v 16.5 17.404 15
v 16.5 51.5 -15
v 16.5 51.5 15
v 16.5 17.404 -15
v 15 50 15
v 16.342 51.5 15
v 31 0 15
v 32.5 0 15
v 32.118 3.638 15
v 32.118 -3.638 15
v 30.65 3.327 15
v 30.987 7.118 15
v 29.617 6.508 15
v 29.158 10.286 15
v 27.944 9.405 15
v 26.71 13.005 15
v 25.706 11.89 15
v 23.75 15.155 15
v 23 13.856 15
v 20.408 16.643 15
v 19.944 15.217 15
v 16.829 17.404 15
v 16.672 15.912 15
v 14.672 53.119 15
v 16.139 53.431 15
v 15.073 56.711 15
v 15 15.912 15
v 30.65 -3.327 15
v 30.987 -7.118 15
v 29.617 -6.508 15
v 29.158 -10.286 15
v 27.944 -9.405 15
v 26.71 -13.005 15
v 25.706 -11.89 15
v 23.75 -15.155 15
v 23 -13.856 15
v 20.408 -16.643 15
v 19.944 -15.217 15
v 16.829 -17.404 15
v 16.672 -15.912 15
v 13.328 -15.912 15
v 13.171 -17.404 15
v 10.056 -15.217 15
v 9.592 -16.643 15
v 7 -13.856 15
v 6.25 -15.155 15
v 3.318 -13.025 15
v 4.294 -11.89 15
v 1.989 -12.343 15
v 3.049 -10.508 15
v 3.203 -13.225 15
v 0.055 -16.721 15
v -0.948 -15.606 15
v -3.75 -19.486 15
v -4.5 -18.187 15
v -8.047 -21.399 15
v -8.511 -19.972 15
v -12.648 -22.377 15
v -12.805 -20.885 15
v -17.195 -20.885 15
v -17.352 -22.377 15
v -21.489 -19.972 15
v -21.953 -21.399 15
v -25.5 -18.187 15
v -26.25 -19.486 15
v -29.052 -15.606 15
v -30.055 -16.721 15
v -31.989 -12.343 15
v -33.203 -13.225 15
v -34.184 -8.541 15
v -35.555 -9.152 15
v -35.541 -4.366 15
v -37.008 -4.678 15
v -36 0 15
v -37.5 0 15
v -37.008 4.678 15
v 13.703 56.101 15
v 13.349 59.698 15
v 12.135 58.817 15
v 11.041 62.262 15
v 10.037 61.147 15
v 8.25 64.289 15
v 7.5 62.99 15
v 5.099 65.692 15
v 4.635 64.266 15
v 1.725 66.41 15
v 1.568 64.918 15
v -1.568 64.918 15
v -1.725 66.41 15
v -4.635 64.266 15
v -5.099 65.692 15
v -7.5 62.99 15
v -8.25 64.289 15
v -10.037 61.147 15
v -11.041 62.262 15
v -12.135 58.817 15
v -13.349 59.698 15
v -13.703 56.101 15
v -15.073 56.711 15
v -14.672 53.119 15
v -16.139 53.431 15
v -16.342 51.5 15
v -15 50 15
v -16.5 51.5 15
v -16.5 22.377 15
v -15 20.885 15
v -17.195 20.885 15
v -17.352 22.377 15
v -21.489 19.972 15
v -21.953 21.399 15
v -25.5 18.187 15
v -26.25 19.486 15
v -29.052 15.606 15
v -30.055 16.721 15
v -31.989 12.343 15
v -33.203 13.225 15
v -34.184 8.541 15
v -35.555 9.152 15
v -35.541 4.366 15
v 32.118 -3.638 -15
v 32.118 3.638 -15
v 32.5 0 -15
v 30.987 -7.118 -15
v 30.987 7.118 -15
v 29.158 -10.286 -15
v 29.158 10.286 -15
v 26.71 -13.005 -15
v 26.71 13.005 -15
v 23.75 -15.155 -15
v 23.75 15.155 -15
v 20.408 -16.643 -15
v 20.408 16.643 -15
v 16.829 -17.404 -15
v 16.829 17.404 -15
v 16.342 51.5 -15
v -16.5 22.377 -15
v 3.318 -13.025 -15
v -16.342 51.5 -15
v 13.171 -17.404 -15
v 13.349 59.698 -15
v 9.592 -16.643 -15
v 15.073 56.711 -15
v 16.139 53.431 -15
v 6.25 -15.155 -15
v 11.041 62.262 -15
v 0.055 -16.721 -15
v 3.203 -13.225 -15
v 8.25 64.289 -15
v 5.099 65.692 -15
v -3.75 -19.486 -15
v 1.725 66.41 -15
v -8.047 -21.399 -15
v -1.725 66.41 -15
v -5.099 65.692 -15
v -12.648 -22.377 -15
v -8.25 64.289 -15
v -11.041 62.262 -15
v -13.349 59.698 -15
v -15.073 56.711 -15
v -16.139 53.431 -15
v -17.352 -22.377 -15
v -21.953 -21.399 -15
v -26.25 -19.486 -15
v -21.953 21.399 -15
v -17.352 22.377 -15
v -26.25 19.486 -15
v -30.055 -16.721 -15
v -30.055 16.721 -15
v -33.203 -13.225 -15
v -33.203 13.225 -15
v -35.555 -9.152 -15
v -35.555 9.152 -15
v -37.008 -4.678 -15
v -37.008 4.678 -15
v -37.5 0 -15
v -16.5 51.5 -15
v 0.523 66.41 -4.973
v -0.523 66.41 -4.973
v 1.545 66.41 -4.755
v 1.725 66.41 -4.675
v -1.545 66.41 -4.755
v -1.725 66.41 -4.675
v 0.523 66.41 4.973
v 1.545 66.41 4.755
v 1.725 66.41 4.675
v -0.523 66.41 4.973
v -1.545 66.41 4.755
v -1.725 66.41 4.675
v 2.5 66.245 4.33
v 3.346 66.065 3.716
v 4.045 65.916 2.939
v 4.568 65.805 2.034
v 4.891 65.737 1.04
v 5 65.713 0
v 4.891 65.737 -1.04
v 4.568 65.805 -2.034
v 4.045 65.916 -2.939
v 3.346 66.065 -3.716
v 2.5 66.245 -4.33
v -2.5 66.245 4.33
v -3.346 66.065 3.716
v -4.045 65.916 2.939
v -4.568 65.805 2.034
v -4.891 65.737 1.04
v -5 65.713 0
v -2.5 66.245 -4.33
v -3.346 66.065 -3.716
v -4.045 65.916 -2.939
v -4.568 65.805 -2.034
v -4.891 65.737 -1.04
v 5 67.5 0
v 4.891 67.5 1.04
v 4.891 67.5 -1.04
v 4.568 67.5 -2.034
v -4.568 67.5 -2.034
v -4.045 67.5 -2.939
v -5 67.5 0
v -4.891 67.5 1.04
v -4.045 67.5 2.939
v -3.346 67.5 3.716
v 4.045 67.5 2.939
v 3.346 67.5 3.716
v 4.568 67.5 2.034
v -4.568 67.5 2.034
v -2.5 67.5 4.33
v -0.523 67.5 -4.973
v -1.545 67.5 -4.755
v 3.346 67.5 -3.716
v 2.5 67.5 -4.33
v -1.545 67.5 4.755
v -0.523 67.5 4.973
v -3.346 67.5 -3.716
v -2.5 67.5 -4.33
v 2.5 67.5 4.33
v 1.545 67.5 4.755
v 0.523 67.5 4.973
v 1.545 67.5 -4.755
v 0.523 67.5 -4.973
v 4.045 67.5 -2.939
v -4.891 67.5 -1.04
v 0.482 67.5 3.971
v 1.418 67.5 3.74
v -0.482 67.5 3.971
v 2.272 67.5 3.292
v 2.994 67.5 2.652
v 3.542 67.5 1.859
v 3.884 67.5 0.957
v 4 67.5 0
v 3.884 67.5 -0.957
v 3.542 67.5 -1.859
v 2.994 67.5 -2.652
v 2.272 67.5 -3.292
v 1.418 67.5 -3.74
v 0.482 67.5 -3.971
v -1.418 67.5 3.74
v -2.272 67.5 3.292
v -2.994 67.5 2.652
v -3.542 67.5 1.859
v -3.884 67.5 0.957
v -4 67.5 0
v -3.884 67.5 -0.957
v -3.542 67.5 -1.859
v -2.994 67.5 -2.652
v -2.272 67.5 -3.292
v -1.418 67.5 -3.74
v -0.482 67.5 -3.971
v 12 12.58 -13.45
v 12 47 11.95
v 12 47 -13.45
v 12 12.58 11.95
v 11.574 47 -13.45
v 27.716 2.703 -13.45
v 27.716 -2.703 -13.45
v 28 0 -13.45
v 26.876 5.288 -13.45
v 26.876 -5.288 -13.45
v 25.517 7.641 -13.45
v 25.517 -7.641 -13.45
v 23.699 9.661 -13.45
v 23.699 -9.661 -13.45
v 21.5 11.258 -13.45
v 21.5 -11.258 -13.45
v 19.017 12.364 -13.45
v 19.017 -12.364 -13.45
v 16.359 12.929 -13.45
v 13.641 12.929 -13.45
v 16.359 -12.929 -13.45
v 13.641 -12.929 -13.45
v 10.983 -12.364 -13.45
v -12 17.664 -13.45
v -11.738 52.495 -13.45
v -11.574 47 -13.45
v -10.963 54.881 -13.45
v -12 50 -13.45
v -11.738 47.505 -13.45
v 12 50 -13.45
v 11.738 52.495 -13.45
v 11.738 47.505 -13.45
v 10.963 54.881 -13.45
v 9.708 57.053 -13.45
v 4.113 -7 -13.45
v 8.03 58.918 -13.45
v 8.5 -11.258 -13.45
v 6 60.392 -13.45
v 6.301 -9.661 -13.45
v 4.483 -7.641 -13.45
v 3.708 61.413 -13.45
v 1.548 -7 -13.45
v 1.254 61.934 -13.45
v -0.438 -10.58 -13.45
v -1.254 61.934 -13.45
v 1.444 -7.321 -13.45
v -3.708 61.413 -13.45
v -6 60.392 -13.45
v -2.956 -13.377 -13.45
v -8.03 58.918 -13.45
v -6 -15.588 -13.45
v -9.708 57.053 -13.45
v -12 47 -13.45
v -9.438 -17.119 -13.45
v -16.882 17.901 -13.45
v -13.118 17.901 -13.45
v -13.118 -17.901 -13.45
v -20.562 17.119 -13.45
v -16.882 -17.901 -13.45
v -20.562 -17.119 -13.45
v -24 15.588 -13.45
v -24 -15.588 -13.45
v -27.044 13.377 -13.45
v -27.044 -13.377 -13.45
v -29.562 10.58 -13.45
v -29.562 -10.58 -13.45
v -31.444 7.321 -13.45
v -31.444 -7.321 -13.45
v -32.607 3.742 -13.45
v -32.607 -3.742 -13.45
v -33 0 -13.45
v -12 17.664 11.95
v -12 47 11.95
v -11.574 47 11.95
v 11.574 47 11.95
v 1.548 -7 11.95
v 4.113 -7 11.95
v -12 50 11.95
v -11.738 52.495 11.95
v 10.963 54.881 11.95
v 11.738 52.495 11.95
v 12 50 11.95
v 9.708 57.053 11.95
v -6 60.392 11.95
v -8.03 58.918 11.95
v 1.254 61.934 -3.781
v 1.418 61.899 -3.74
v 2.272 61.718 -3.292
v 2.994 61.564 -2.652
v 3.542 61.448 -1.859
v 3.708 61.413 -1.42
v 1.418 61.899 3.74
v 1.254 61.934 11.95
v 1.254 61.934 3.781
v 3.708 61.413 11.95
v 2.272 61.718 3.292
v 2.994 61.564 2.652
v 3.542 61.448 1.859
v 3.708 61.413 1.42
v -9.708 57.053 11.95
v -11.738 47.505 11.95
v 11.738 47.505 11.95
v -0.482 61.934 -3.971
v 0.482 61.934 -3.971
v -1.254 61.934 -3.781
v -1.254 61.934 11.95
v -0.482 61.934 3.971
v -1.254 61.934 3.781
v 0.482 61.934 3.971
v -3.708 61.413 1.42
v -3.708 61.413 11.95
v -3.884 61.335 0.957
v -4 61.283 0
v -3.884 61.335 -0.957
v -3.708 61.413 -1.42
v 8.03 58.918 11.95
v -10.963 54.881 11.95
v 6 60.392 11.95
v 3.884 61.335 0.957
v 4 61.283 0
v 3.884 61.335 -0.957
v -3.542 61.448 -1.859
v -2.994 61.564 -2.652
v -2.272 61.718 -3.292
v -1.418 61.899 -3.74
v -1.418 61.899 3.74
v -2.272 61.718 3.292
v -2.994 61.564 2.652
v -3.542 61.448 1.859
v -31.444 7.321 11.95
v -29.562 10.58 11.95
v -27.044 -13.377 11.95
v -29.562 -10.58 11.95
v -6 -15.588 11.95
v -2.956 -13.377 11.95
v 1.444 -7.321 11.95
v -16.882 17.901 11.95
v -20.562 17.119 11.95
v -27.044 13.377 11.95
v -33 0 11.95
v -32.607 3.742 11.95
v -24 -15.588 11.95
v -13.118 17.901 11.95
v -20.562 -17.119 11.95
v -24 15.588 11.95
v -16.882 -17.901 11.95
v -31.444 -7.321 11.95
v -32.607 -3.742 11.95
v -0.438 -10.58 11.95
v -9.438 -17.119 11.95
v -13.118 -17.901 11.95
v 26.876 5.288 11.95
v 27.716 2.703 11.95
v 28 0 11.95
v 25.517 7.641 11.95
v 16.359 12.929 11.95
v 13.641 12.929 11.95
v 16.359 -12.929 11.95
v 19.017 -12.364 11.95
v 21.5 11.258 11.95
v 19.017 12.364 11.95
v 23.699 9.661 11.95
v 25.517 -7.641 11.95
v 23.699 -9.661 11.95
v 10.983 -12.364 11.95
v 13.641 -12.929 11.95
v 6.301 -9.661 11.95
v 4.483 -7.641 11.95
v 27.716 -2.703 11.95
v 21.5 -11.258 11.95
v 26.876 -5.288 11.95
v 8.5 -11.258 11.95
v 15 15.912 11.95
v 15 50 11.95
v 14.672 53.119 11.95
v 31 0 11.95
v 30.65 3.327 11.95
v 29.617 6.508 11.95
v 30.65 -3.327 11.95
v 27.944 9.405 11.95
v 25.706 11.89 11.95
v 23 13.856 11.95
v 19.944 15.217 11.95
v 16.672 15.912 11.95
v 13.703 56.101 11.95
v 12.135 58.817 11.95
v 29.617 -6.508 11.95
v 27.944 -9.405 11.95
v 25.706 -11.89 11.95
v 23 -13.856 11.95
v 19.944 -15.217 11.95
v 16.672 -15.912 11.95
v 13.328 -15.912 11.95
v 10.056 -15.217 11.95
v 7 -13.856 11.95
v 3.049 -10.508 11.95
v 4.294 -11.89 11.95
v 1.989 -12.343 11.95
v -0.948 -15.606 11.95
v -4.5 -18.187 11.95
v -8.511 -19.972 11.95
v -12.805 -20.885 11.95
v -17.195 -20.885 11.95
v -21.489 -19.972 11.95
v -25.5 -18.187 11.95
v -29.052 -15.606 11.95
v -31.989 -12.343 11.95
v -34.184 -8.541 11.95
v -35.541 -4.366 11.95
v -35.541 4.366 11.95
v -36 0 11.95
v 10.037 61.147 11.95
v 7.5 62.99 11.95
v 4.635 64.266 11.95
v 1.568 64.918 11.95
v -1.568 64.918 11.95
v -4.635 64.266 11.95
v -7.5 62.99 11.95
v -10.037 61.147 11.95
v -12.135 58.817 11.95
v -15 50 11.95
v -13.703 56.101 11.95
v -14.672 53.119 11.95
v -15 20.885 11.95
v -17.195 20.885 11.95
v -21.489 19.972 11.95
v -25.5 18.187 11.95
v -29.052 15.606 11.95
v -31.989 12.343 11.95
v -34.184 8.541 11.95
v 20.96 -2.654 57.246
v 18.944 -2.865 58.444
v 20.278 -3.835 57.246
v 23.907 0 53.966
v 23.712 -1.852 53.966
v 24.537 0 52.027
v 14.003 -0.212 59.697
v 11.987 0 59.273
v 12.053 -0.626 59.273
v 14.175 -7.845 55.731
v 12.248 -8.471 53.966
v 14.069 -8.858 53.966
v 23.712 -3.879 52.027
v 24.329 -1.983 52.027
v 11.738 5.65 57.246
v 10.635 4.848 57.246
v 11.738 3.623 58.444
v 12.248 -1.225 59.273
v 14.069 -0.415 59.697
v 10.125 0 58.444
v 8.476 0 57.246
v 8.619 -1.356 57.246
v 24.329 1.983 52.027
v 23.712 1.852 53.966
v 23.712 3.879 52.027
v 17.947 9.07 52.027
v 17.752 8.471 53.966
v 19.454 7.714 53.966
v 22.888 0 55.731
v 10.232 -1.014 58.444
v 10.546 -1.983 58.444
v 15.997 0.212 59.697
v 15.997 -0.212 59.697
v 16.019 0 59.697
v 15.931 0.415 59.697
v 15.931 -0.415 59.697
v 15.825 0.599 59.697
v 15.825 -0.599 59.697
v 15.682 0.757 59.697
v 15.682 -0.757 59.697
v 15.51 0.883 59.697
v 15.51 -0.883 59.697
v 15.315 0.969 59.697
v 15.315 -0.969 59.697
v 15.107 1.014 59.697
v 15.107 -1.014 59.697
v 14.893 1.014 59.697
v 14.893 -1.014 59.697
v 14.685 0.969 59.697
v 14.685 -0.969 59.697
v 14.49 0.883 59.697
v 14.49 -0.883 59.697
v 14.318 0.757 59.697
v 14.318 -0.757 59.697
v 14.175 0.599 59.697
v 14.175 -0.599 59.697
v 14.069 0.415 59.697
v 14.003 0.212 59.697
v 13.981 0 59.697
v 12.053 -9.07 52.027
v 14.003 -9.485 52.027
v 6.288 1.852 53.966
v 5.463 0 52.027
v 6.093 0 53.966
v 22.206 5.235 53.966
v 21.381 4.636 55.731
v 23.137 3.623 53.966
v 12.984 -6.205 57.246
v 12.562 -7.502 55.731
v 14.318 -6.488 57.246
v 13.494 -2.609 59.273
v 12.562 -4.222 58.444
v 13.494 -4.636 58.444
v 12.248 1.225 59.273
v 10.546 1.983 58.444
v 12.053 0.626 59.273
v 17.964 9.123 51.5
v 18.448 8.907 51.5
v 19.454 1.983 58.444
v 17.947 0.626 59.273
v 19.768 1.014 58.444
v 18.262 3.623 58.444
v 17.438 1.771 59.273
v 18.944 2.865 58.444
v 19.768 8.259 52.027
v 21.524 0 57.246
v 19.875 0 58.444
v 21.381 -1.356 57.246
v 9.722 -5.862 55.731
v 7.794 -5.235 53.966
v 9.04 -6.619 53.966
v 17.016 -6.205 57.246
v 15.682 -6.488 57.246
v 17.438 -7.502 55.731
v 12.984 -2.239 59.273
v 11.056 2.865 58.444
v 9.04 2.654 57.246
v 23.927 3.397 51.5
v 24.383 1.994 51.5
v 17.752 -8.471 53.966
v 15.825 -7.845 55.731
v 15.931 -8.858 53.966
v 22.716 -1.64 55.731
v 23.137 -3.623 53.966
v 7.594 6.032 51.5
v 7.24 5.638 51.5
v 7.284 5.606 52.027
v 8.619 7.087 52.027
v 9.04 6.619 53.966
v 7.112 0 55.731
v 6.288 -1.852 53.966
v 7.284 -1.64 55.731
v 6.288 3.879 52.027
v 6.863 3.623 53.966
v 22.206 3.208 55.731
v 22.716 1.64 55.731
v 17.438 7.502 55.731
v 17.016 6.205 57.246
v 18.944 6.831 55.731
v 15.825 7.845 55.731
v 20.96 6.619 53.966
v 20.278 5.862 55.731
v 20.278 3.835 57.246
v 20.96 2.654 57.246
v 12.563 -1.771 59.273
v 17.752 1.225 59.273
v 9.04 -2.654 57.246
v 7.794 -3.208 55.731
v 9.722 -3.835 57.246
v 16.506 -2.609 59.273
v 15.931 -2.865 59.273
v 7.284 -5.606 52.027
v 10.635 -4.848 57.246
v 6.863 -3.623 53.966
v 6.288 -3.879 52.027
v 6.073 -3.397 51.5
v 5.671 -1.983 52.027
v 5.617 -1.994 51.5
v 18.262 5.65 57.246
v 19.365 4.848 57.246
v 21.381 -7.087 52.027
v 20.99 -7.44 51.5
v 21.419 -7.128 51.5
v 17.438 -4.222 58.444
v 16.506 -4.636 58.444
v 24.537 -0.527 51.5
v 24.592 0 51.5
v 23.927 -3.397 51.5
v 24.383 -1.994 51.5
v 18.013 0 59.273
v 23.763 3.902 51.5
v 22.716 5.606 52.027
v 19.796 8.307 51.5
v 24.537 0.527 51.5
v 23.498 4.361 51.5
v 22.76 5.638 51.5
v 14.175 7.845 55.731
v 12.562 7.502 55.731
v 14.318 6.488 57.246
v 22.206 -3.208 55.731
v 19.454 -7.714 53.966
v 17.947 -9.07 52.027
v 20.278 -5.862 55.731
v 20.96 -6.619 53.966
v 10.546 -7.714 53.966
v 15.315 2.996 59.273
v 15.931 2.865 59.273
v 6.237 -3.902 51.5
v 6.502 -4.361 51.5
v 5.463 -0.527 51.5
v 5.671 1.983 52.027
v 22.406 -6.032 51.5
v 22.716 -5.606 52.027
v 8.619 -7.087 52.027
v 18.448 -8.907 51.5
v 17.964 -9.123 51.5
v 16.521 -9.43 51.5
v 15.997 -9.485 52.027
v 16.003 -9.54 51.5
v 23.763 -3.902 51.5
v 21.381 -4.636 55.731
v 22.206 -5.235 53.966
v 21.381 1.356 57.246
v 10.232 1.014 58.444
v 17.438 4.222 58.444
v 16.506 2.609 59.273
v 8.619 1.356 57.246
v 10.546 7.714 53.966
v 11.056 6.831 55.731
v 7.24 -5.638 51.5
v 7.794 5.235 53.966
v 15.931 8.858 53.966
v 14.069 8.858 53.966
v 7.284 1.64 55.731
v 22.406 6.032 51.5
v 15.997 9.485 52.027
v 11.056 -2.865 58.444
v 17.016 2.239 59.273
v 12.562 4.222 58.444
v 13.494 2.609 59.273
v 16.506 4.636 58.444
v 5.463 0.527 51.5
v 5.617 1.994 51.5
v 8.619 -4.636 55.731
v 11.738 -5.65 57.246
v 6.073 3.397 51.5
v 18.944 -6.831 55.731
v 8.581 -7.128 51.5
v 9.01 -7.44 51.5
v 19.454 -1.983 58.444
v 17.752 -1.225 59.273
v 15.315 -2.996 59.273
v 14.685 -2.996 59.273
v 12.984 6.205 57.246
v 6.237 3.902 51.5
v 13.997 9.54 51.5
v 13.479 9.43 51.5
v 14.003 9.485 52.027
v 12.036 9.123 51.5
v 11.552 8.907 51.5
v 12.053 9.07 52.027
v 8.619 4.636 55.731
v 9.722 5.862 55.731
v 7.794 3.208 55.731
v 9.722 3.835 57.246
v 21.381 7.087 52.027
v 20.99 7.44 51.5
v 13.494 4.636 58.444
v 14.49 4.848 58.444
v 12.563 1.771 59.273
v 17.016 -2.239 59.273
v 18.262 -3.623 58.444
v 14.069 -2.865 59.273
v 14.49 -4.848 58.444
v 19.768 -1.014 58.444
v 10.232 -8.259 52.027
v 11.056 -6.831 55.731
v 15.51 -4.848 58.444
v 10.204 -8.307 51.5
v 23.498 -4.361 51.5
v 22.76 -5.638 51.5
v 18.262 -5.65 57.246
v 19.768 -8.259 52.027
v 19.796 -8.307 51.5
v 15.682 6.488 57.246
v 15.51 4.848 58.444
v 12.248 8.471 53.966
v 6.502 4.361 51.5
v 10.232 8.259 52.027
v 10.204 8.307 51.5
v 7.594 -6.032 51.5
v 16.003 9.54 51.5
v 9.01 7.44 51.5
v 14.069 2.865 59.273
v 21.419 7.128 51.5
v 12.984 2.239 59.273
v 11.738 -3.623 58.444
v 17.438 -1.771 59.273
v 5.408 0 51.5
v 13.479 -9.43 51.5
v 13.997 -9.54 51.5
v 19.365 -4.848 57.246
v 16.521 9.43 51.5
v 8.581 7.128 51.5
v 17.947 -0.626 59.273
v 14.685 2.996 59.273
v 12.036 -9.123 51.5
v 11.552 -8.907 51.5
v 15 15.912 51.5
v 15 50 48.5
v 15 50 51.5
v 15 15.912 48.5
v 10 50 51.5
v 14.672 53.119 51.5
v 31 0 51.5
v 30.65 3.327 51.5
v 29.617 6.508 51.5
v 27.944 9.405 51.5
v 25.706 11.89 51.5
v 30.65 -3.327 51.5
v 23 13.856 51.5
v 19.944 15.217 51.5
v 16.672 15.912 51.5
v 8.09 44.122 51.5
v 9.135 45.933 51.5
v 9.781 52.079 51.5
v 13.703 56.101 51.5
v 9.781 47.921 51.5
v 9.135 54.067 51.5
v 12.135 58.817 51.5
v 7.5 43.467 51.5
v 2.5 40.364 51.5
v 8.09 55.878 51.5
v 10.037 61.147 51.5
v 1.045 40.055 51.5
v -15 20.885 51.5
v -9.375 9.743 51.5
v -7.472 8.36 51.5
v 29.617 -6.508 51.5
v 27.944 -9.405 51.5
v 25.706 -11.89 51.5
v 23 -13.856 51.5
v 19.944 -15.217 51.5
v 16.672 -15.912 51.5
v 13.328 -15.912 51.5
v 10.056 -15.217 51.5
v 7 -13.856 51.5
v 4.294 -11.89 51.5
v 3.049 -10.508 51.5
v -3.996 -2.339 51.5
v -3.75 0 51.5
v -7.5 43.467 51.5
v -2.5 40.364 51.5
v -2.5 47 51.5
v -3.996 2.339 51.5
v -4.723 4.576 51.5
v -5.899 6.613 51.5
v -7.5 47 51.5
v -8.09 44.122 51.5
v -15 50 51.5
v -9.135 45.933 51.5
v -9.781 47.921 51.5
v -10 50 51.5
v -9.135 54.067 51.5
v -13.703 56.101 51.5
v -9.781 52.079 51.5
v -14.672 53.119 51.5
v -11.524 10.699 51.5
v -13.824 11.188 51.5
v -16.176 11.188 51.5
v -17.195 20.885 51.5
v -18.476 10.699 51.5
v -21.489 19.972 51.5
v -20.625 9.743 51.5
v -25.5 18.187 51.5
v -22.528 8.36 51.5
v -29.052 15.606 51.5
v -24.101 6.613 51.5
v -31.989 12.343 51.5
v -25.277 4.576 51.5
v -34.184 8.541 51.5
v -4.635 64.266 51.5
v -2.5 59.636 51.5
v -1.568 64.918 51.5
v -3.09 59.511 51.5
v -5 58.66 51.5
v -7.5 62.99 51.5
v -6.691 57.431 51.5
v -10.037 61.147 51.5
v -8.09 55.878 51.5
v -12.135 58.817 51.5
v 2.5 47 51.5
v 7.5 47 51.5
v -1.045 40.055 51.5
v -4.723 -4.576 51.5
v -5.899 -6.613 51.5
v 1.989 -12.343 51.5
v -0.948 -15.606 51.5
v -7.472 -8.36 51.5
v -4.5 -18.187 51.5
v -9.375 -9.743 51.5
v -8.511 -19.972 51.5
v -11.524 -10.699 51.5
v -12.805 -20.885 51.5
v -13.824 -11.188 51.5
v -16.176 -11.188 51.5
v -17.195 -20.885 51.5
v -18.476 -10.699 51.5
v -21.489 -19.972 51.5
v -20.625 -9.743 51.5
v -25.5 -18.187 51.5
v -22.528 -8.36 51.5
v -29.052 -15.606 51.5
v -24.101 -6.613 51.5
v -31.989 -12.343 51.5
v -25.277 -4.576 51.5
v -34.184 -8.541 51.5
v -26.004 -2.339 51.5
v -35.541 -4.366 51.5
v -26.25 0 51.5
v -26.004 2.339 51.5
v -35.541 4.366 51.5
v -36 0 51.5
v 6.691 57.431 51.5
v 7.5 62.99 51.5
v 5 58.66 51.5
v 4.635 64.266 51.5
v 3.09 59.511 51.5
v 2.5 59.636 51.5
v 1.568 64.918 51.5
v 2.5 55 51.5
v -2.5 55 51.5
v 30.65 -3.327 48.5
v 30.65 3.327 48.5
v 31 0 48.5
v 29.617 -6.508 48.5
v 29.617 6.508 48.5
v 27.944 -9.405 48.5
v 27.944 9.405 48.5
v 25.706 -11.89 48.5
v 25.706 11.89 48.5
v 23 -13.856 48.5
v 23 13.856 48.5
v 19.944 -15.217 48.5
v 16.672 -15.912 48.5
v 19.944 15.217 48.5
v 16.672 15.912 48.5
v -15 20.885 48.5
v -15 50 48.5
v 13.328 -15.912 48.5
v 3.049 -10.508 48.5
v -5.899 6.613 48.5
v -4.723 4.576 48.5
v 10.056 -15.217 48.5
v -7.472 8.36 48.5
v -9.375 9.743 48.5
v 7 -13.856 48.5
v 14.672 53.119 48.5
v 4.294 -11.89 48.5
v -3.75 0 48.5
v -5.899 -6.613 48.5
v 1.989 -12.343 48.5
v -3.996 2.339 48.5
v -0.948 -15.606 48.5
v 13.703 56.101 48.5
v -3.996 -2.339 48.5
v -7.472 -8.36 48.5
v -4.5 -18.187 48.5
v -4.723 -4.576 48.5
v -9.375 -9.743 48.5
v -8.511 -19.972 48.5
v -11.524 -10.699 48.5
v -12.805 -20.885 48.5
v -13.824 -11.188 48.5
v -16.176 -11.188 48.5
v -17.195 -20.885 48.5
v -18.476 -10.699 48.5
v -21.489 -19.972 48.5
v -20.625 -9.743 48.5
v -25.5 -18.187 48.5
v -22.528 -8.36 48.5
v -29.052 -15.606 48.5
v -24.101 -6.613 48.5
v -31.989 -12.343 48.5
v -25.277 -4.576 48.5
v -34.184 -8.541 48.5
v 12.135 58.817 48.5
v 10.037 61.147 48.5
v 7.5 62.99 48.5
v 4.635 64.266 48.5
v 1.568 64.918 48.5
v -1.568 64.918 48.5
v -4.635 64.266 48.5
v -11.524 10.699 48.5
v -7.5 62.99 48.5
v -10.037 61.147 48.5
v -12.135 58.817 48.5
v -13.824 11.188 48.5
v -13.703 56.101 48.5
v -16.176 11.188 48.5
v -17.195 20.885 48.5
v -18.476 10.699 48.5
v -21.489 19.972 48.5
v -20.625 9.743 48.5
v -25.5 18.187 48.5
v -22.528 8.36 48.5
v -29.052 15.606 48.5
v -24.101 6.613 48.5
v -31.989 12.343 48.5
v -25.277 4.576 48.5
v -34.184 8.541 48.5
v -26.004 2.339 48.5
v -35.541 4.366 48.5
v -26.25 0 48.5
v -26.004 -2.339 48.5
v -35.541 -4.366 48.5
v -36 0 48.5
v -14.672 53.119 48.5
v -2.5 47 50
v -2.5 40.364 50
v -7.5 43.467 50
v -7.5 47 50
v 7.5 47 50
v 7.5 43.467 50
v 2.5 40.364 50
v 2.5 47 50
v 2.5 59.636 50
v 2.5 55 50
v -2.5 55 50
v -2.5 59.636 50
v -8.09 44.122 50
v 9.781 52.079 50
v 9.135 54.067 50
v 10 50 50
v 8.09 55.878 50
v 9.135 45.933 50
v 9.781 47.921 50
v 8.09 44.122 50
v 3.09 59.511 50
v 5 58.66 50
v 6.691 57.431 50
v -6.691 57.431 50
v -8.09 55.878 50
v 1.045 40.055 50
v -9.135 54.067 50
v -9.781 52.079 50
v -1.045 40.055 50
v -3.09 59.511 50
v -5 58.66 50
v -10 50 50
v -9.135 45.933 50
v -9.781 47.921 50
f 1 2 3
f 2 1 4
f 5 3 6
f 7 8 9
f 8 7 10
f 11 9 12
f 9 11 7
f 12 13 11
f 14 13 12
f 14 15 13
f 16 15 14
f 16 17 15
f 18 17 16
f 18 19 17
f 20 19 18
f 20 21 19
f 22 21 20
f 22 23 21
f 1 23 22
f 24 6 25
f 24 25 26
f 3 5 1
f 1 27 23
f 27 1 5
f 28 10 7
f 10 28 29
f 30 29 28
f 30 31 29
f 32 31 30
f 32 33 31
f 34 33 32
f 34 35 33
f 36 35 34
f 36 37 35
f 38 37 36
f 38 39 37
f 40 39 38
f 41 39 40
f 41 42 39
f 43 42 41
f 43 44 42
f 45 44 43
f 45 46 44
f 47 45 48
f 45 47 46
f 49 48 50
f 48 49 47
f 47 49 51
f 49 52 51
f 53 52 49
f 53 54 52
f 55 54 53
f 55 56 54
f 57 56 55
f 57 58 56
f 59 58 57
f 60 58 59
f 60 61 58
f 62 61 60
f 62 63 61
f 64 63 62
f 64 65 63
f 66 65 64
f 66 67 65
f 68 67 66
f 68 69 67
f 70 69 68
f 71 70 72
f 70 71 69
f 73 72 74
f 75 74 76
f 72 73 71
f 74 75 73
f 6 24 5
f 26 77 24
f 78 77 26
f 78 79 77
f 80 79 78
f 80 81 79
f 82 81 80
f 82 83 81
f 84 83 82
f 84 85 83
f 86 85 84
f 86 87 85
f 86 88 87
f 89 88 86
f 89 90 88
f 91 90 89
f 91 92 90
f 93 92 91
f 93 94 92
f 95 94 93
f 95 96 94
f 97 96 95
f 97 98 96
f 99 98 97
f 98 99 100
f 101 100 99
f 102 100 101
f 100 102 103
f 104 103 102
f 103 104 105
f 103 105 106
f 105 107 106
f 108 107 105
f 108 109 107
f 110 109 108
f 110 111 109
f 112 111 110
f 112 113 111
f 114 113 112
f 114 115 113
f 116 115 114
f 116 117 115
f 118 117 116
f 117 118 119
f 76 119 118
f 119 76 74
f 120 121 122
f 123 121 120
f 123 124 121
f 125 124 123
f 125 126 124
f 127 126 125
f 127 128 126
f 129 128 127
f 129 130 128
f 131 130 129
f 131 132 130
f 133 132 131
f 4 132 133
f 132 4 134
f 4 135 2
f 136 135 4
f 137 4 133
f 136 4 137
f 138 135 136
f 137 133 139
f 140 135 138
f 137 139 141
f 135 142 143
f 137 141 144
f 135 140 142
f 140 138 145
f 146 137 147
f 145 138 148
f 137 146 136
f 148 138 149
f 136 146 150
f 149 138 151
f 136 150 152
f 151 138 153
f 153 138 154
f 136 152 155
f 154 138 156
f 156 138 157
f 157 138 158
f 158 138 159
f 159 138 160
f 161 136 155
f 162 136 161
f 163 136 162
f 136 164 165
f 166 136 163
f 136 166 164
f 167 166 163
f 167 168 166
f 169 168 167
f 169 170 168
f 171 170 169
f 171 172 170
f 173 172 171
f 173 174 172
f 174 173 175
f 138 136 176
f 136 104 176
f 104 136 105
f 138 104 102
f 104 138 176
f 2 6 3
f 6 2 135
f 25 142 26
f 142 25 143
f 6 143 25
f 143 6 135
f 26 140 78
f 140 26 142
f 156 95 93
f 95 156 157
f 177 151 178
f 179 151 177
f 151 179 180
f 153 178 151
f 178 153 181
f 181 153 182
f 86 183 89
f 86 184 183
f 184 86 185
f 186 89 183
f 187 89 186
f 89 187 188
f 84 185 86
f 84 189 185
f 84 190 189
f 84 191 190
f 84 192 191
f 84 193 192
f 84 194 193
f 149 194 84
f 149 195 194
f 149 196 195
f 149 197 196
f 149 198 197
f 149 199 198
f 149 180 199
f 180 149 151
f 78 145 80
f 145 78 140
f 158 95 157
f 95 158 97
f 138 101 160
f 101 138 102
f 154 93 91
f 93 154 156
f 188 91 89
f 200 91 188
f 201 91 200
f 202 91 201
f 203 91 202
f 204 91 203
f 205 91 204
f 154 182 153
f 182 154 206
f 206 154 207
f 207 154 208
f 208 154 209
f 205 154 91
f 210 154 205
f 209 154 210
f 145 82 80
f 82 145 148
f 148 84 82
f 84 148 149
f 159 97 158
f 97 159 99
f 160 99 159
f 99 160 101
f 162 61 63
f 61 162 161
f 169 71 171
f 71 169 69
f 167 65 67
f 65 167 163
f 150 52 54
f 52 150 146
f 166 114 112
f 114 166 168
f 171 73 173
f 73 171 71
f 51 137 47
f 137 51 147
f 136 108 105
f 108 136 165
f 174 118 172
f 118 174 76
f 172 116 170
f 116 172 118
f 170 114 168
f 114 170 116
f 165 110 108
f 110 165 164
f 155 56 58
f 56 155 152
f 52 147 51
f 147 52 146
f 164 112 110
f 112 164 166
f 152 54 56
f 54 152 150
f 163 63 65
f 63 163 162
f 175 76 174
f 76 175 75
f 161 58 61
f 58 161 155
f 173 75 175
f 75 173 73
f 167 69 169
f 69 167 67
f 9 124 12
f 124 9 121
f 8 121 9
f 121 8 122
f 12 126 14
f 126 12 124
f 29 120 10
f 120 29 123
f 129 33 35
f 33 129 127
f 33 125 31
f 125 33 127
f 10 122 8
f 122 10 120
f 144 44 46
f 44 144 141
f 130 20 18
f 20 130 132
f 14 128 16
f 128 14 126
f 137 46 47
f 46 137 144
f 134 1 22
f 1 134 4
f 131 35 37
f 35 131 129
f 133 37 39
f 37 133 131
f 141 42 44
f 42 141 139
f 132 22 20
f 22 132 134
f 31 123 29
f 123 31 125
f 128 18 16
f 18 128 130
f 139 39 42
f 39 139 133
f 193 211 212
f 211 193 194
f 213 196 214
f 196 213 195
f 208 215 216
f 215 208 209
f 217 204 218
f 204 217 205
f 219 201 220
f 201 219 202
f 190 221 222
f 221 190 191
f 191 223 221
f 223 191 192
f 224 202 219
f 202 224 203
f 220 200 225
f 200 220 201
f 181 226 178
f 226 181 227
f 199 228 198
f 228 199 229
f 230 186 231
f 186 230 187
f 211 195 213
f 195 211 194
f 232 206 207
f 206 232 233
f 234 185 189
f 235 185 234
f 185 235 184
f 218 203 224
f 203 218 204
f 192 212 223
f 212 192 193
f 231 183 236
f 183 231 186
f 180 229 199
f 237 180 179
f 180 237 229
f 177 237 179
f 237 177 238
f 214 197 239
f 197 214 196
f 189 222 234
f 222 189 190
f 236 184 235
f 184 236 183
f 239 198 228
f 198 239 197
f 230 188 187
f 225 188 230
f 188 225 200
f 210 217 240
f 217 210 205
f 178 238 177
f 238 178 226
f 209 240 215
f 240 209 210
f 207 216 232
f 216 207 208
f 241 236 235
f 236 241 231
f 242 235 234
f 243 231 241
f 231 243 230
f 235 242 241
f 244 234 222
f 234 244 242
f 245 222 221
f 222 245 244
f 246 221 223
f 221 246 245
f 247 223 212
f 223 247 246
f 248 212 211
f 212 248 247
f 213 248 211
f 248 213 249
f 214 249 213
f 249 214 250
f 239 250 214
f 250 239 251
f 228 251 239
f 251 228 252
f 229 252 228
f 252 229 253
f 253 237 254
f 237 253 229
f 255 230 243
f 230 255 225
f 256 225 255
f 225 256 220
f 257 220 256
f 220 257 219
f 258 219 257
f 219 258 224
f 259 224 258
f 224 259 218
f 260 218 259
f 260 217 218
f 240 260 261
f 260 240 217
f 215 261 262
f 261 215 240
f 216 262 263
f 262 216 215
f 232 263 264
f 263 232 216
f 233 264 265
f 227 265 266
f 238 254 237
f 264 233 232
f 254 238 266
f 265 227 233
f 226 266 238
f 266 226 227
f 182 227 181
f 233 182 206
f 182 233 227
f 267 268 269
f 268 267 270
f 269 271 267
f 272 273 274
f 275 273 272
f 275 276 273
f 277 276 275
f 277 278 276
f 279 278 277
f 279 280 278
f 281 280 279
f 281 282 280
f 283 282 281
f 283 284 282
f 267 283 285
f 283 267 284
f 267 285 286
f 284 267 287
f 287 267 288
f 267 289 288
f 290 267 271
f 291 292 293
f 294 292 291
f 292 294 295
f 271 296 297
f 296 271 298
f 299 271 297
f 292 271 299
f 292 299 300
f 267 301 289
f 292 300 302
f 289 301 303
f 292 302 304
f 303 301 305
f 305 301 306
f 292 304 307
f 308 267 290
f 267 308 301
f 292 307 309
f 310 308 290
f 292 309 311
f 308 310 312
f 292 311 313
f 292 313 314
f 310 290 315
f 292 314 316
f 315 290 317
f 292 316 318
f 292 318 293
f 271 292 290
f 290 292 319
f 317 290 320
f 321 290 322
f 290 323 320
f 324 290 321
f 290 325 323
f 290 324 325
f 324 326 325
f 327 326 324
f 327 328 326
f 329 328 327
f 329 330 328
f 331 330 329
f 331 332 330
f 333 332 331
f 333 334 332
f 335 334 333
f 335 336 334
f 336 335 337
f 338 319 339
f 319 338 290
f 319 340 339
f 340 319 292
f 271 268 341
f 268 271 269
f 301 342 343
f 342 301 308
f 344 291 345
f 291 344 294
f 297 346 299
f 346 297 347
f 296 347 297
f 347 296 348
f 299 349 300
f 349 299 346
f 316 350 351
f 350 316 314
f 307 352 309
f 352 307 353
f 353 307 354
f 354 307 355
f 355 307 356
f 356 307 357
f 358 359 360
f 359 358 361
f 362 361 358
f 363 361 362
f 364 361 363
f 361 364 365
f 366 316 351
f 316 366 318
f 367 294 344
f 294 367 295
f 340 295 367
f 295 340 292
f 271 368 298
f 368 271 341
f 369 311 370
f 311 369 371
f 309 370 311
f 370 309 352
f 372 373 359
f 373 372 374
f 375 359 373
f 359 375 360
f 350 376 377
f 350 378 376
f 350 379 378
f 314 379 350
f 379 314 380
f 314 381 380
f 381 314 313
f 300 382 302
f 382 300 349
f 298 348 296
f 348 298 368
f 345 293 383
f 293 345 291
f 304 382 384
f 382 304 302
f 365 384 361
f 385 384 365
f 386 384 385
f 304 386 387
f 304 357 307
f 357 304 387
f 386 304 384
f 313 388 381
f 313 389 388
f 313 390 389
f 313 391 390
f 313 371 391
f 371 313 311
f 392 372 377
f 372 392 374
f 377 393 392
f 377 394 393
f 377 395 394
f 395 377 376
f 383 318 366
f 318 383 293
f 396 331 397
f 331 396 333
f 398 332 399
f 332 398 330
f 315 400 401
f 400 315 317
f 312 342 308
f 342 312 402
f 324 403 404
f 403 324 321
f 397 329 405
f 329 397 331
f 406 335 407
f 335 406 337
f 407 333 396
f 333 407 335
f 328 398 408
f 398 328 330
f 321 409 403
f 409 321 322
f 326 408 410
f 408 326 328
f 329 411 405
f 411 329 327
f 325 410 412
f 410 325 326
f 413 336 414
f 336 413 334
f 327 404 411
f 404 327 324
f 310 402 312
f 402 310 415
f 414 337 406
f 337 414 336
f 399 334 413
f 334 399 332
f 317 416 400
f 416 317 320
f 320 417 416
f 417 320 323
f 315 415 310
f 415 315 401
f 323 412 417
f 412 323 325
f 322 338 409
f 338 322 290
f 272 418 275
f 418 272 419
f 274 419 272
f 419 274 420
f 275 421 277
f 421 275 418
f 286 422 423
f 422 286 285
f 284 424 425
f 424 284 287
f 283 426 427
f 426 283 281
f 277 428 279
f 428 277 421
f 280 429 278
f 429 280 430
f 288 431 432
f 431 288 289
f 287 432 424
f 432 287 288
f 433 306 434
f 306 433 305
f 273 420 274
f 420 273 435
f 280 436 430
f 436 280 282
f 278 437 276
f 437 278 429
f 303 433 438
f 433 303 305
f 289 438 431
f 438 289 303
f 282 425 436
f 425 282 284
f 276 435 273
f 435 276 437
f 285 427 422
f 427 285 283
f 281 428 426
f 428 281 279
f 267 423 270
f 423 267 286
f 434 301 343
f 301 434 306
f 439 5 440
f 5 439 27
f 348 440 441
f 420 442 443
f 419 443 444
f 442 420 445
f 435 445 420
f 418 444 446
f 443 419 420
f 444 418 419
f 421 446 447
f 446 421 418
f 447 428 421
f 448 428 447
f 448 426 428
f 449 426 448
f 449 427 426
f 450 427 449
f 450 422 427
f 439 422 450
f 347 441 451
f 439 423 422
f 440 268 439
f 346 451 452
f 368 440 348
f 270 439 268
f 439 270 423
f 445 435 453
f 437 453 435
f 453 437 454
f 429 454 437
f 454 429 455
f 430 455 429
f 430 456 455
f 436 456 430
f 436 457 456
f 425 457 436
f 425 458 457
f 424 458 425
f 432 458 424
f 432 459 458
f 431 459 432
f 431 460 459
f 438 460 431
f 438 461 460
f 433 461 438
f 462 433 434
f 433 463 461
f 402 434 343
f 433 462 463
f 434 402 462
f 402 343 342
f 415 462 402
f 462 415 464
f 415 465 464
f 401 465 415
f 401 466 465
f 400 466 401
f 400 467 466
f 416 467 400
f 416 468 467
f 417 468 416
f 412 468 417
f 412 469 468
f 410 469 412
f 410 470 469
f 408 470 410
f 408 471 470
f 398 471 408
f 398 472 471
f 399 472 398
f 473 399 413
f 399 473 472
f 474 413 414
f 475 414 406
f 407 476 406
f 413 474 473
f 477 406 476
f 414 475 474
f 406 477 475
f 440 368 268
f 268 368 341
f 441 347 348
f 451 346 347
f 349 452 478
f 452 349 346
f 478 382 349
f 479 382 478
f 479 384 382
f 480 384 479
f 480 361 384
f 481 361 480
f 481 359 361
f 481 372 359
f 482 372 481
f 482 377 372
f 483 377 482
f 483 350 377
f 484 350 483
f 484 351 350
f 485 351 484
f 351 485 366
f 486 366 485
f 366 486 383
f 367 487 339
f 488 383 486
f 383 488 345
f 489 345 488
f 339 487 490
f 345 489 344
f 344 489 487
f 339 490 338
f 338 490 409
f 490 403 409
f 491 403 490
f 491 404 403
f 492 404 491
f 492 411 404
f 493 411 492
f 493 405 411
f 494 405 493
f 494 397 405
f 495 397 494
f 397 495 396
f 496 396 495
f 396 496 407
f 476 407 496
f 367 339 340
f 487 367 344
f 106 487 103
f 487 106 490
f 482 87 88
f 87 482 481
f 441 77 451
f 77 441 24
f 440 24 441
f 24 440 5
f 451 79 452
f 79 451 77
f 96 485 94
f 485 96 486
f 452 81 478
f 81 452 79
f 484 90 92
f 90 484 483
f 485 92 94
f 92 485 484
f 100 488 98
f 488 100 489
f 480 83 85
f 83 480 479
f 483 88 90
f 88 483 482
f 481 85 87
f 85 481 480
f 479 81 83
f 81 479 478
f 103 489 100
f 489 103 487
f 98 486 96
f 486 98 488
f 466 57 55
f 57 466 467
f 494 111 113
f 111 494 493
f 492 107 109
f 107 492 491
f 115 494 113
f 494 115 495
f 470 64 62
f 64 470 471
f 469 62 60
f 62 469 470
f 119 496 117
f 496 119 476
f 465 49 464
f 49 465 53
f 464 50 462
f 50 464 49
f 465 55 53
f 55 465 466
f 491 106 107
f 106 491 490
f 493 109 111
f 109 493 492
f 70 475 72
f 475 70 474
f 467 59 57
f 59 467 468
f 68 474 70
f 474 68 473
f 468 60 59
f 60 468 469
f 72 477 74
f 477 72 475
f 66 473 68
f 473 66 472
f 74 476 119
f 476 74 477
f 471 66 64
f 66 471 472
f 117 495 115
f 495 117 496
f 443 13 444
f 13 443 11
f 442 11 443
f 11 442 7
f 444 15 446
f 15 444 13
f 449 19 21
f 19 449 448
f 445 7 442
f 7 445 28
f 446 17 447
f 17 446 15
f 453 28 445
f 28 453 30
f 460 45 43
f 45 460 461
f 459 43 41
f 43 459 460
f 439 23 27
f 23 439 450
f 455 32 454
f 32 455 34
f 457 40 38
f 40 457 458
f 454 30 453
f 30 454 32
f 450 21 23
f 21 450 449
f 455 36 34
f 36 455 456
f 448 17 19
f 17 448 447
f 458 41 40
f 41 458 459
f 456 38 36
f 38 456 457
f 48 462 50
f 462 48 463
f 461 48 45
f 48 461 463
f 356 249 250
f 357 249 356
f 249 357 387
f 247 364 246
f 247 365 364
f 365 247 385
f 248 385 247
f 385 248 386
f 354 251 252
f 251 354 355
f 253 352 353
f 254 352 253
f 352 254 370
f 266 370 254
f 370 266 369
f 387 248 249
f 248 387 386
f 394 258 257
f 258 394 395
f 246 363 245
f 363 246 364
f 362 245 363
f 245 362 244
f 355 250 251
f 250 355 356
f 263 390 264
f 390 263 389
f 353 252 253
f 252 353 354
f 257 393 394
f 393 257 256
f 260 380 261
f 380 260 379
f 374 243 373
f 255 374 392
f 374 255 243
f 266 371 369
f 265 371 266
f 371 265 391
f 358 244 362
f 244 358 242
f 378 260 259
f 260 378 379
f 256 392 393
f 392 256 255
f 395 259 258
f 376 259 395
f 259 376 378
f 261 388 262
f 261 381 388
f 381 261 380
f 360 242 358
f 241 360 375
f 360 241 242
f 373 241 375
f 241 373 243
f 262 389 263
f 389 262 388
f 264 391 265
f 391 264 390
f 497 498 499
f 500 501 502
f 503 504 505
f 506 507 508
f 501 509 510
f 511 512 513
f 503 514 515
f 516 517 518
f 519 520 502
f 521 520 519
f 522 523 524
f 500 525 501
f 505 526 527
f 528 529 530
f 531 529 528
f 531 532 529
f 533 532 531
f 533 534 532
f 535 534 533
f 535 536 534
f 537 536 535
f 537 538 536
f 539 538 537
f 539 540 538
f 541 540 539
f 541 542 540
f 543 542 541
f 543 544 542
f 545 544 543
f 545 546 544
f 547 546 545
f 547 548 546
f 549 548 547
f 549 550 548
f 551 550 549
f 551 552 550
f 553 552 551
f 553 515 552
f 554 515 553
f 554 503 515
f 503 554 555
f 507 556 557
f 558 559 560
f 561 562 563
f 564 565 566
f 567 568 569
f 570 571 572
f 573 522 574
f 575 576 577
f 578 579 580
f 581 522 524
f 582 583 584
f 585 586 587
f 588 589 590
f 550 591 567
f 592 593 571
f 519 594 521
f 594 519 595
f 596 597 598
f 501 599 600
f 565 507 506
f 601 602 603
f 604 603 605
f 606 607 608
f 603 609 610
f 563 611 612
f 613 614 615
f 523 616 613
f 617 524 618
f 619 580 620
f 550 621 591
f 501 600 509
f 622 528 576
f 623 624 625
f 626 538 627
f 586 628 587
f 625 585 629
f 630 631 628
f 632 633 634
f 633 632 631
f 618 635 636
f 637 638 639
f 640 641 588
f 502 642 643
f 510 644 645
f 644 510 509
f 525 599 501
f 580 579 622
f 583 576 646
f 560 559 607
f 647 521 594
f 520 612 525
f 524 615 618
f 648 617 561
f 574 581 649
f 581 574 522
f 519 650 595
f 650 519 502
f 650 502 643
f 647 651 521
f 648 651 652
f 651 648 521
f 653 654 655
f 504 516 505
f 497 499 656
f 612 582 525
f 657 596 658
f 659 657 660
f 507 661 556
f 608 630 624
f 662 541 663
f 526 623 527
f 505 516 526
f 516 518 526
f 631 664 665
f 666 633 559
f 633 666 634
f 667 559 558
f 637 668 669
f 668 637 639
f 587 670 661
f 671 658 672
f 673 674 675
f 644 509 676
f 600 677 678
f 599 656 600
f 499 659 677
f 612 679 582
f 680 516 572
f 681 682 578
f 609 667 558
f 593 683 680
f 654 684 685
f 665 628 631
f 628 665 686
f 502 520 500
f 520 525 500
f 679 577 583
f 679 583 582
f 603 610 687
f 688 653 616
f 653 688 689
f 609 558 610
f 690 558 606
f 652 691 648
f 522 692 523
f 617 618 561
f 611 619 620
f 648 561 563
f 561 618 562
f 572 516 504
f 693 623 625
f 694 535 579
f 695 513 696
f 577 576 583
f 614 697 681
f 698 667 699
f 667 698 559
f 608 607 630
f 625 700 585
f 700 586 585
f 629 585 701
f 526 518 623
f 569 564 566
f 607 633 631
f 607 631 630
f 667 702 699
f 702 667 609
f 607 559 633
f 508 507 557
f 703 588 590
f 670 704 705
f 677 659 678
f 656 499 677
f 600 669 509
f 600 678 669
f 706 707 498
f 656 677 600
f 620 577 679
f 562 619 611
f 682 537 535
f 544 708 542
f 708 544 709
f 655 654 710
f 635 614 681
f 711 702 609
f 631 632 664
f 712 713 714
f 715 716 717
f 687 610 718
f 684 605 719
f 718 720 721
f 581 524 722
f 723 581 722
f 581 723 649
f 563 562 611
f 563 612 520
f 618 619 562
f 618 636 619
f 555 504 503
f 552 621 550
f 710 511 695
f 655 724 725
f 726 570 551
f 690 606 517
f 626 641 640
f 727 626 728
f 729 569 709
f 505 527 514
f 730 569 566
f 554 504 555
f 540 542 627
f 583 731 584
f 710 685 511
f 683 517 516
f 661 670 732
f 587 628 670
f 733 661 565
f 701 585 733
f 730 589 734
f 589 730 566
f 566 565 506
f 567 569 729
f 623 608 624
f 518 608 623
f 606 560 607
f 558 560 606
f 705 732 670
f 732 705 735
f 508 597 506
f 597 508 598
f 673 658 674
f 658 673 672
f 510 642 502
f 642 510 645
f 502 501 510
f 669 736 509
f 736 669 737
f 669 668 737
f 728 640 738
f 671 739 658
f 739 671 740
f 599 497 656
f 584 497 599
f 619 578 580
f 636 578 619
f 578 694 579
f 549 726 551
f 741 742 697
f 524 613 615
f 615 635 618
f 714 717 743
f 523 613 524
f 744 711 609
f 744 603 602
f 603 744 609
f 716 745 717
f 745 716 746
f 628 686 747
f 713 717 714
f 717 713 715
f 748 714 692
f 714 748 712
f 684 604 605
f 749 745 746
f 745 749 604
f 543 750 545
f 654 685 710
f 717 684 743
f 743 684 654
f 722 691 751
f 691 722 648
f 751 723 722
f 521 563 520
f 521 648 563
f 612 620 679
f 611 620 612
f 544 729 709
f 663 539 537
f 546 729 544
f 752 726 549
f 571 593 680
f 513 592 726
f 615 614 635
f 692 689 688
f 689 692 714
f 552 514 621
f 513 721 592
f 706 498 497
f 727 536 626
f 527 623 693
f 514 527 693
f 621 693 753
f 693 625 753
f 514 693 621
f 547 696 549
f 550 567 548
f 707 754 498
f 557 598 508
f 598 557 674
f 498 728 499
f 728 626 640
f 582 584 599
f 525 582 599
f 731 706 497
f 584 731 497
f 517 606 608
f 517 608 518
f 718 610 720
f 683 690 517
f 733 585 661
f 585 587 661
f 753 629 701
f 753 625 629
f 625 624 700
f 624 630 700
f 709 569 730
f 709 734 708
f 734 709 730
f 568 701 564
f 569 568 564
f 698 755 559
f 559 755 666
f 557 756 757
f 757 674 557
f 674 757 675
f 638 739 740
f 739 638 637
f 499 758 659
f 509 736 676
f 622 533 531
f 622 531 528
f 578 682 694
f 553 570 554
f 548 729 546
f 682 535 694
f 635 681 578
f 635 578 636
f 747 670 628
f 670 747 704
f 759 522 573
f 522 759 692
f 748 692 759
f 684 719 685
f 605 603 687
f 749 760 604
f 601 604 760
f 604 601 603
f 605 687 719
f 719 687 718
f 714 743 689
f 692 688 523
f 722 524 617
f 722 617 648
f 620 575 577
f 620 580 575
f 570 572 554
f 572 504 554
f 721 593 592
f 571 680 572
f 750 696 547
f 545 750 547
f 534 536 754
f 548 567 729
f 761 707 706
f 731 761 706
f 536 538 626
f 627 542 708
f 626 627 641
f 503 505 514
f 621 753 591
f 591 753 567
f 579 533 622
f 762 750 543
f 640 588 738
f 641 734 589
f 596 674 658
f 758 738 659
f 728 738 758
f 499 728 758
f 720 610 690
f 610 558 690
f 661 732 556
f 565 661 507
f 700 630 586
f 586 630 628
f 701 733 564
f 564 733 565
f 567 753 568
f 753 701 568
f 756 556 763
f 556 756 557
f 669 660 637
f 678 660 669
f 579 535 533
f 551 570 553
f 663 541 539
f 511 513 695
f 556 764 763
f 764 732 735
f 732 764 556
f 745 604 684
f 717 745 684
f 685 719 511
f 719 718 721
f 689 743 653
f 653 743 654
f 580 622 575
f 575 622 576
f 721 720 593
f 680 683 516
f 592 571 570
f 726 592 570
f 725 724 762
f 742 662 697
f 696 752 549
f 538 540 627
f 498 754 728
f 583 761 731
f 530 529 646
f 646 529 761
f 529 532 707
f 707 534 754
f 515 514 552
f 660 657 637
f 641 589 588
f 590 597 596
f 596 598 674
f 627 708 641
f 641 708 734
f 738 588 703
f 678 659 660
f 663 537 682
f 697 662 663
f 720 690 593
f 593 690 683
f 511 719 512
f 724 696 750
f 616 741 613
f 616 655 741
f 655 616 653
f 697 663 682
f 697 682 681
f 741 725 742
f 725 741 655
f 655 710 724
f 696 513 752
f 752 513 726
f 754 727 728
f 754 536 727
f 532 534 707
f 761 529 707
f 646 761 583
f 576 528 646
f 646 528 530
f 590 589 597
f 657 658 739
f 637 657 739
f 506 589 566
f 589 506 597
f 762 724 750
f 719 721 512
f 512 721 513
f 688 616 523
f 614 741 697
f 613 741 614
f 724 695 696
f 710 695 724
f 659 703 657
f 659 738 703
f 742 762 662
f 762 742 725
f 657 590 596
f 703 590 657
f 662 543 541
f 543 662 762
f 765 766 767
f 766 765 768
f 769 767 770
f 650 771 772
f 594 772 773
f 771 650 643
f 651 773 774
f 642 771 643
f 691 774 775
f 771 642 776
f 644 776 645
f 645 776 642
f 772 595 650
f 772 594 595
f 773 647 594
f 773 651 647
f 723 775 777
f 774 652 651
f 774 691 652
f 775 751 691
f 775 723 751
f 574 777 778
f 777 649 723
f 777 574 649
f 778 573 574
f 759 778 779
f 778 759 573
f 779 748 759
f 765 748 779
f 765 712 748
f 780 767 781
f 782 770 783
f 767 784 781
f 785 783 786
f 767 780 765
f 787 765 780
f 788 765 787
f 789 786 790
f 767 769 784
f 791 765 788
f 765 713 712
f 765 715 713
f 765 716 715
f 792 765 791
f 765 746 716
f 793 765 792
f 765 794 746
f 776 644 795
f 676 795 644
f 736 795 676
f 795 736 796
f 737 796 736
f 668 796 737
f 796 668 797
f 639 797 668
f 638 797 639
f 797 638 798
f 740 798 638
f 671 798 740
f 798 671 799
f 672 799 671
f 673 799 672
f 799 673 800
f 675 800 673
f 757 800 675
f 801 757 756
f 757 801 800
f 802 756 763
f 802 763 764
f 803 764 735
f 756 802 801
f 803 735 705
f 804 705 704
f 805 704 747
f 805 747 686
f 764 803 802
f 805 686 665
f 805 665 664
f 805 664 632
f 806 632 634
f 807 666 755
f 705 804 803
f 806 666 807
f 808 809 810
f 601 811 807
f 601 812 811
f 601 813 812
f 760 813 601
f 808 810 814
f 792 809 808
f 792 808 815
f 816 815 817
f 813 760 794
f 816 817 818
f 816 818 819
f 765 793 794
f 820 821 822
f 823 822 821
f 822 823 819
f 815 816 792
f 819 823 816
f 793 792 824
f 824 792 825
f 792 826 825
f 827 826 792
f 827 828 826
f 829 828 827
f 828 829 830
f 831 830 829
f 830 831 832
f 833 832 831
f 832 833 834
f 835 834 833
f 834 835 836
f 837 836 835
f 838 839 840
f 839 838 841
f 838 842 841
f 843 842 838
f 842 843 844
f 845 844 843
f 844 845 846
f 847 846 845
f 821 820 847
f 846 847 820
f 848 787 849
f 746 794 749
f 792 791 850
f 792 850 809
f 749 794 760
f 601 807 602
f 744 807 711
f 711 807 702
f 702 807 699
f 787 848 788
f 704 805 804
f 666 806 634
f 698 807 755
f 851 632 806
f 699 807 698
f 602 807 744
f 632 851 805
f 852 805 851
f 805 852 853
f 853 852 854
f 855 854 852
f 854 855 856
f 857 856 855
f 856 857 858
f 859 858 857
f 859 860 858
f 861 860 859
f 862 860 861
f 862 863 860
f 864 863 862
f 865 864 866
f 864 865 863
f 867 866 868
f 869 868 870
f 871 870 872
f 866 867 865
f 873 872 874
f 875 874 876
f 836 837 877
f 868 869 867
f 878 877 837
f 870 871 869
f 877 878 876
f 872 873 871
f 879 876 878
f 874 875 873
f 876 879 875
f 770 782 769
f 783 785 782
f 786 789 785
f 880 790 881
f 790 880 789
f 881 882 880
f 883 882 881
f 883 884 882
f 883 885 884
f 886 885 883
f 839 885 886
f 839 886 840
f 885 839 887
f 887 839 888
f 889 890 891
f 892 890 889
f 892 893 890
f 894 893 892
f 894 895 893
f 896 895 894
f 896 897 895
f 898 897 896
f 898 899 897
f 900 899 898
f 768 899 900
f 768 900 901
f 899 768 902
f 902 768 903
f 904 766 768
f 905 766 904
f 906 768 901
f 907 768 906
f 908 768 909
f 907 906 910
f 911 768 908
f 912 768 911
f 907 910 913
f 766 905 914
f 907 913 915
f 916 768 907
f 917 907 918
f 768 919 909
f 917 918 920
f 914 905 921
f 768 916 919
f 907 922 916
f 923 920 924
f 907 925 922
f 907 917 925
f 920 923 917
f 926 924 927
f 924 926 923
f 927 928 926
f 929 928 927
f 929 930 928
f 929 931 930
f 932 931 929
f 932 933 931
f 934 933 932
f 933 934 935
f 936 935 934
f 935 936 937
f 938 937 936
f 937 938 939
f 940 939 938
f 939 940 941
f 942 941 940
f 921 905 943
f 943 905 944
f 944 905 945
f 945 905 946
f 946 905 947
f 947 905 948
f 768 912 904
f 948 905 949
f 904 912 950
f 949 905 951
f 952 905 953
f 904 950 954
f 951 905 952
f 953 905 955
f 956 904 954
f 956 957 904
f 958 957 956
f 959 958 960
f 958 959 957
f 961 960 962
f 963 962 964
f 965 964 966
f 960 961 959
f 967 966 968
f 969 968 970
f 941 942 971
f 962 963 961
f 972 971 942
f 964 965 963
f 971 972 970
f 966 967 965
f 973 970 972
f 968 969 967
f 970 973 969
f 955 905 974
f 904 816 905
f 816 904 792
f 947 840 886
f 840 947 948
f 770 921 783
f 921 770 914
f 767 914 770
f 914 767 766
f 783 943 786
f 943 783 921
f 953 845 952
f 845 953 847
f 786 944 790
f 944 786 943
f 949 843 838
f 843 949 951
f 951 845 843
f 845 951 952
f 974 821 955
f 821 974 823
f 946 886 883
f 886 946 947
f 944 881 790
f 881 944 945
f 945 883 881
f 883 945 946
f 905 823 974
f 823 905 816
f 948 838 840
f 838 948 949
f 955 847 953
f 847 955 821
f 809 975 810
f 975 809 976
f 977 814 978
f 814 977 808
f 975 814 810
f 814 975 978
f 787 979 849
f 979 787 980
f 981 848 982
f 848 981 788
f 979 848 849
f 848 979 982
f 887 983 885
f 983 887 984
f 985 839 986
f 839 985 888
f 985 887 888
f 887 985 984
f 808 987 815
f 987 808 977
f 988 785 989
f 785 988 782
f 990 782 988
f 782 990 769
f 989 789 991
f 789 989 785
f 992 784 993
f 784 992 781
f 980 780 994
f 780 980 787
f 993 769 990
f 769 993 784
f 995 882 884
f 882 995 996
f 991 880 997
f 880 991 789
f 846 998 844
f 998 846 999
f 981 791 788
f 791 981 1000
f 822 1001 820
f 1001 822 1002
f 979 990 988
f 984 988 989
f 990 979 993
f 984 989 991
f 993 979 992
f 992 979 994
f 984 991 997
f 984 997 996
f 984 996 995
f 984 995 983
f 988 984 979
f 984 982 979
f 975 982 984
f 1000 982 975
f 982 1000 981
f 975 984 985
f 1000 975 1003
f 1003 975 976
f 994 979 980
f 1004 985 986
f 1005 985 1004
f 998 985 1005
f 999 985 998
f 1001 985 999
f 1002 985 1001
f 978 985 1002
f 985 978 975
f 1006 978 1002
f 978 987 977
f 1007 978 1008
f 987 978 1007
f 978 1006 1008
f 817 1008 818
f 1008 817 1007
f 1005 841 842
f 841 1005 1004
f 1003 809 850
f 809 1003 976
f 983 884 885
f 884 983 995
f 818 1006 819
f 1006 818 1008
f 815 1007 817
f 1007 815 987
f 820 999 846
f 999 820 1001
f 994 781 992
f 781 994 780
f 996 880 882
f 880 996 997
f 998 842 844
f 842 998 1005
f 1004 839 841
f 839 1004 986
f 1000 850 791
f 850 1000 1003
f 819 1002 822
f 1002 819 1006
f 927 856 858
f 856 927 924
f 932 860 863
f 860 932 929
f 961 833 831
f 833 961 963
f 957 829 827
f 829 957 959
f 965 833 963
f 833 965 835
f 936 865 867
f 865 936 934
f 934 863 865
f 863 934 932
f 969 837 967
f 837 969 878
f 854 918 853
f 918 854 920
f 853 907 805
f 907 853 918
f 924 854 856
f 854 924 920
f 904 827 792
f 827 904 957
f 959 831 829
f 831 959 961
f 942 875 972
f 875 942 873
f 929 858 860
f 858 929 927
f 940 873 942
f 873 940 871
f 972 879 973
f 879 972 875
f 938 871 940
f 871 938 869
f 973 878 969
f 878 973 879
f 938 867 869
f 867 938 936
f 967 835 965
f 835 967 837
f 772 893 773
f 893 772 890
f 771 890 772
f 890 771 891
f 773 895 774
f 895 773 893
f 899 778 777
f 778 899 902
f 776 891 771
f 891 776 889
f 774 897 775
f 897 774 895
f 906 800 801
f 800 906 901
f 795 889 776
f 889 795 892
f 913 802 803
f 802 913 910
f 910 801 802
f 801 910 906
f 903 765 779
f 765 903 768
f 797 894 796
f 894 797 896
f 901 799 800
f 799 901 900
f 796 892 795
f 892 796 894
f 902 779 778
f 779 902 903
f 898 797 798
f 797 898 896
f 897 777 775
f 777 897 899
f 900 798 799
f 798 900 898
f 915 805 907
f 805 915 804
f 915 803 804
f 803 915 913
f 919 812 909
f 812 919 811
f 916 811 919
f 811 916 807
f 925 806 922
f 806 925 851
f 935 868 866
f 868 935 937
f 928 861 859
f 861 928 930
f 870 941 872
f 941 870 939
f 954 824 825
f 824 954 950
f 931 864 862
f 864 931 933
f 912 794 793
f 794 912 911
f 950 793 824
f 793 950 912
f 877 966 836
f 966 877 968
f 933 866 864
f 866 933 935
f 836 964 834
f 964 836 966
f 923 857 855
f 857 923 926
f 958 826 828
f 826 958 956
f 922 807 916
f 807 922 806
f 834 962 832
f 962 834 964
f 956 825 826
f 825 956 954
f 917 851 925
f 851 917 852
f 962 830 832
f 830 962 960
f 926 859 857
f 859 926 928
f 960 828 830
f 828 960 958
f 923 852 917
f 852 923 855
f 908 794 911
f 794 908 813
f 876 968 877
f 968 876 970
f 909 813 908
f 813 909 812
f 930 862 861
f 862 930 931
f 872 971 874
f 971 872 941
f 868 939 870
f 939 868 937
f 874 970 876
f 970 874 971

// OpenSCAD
$fs=1;

ORB_D=22.5;
pirDiameter = ORB_D;

BOX_W=23.3;
BOARD_W=32.5;
BOARD_H=24.3;
MOUNT_SEP=29;

CLEARANCE=1;

ENCLOSURE_HEIGHT=25;
FRONT_THICK=4;
BOX_DEPTH=2;

OVERSIZE = 20;

STAKE_LENGTH=40;

faceMain();
translate([0,0,50])
    facePlate();

// Inter pupilllary distance
IPD = 30;

// For preventing z-fighting
epsilon = 0.1;

// Thickness of all walls
thickness = 3;

// This has to be enough to accomodate the PIR PCB
occipitalDiameterA = 42;
occipitalDiameterB = 42 - 10;

// Fake eye
eyeDiameter = pirDiameter - 3;

// Depth of the face - needs to be deep enough for a nano and PIR(21mm)
faceDepth = 30;

// The lower part of the face
jawWidth = 30;

// The jaw needs to be tall enough for a nano + a buck converter (43mm each)
jawDepth = 60;

// How far down the face is the jaw?
jawOffset = 40;

// Size of the mouth
mouthSize = 20;

// Step size
stepSize = thickness * 2;

module faceMain() {
    difference () {
        union () {
            translate([-IPD / 2, 0, 0])
                cylinder(h=faceDepth, d=occipitalDiameterA + thickness, center=true);
            translate([IPD / 2, 0, 0])
                cylinder(h=faceDepth, d=occipitalDiameterB + thickness, center=true);

            translate([0, jawDepth - jawOffset, 0]) {
                cube([jawWidth + thickness, jawDepth + thickness, faceDepth], center=true);
                translate([0, jawDepth / 2, 0]) {
                    cylinder(h=faceDepth, d=jawWidth + thickness, center=true);
                }
            }

            // Cable hole
            translate([0, jawDepth / 2 + jawOffset - 5, 0])
                rotate([90,0,0])
                    cylinder(h=5, d=10, center = true);
        }
        
        union () {
            // Cable hole
            translate([0, jawDepth / 2 + jawOffset - 5, 0])
                rotate([90,0,0])
                    cylinder(h=10 + epsilon, d=8, center = true);
            
            // Interior space
            translate([0, 0, thickness + epsilon - thickness]) {
                translate([-IPD / 2, 0, 0])
                    cylinder(h=faceDepth + epsilon - thickness, d=occipitalDiameterA - stepSize, center=true);
                translate([IPD / 2, 0, 0])
                    cylinder(h=faceDepth + epsilon - thickness, d=occipitalDiameterB - stepSize, center=true);

                translate([0, jawDepth - jawOffset, 0]) {
                    cube([jawWidth - stepSize, jawDepth - stepSize, faceDepth + epsilon - thickness], center=true);
                    translate([0, jawDepth / 2, 0]) {
                        cylinder(h=faceDepth + epsilon - thickness, d=jawWidth - stepSize, center=true);
                    }
                }
            }

            // Step
            translate([0, 0, faceDepth / 2 - thickness / 2]) {
                translate([-IPD / 2, 0, 0])
                    cylinder(h=epsilon + thickness, d=occipitalDiameterA, center=true);
                translate([IPD / 2, 0, 0])
                    cylinder(h=epsilon + thickness, d=occipitalDiameterB, center=true);

                translate([0, jawDepth - jawOffset, 0]) {
                    cube([jawWidth, jawDepth, thickness + epsilon], center=true);
                    translate([0, jawDepth / 2, 0]) {
                        cylinder(h=thickness + epsilon, d=jawWidth, center=true);
                    }
                }
            }
            
        }
    }
}

module facePlate() {
    union () {
        // Fake eye
        translate([IPD / 2, 0, 0]) {
            difference() {
                sphere(d=eyeDiameter, center=true);
                translate([0, 0, -eyeDiameter / 2])
                    cube([eyeDiameter, eyeDiameter, eyeDiameter], center = true);
            }
        }
        
        // Occipital
        difference () {
            union () {
                translate([-IPD / 2, 0, 0])
                    cylinder(h=thickness, d=occipitalDiameterA, center=true);
                translate([IPD / 2, 0, 0])
                    cylinder(h=thickness, d=occipitalDiameterB, center=true);

                // Jaw
                translate([0, jawDepth - jawOffset, 0]) {
                    difference() {
                        union () {
                            cube([jawWidth, jawDepth, thickness], center=true);
                            translate([0, jawDepth / 2, 0])
                                cylinder(h=thickness, d=jawWidth, center=true);
                        }

                        translate([0, jawDepth / 2, thickness / 2]) {
                            difference () {
                                // Mouth hole
                                cylinder(h=thickness, d=mouthSize, center=true);

                                // Teeth
                                union () {
                                    translate([-5, -8, 0])
                                        cube([5, 10, thickness + epsilon], center = true);
                                    translate([5, -8, 0])
                                        cube([5, 10, thickness + epsilon], center = true);
                                    translate([0, 10, 0])
                                        cube([5, 10, thickness + epsilon], center = true);
                                }
                            }
                        }                            
                    }
                }
            }

            translate([-IPD / 2, 0, 0])
                cylinder(h=thickness + epsilon, d=ORB_D, center=true);
        }
        
    }
}

/*    
    translate([0,-(STAKE_LENGTH/2)-(BOARD_H+5)/2,-ENCLOSURE_HEIGHT/2+1.5])

    union() {
        cube([6,STAKE_LENGTH,3], center=true);
        translate([0,-STAKE_LENGTH/2,0])
        scale([1,3,1])
        rotate([0,0,45])
            cube([6/1.414,6/1.414,3], center=true);
    }
    */

    

module lid() {
    union() {
        roundedCube(BOARD_W+OVERSIZE+5, BOARD_H+5, 2, 5);
        translate([0,0,-2.5])
            difference() {
                cube([BOARD_W+OVERSIZE+1.5, BOARD_H+1.5, 3], center=true);
                translate([-BOARD_W / 2,BOARD_H*0,0])
                    cube([BOARD_H,5,3.5], center=true);
            }

    }
}

module roundedCube(x, y, z, rounding) {
    
    cylX = (x-rounding)/2;
    cylY = (y-rounding)/2;
    
    union() {
        cube([x-rounding, y, z], center=true);
        cube([x, y-rounding, z], center=true);
        
        for(a=[-cylX, cylX])
            for(b=[-cylY, cylY])
                translate([a,b,0])
                    cylinder(d=rounding,h=z, center=true);
        }
    }
